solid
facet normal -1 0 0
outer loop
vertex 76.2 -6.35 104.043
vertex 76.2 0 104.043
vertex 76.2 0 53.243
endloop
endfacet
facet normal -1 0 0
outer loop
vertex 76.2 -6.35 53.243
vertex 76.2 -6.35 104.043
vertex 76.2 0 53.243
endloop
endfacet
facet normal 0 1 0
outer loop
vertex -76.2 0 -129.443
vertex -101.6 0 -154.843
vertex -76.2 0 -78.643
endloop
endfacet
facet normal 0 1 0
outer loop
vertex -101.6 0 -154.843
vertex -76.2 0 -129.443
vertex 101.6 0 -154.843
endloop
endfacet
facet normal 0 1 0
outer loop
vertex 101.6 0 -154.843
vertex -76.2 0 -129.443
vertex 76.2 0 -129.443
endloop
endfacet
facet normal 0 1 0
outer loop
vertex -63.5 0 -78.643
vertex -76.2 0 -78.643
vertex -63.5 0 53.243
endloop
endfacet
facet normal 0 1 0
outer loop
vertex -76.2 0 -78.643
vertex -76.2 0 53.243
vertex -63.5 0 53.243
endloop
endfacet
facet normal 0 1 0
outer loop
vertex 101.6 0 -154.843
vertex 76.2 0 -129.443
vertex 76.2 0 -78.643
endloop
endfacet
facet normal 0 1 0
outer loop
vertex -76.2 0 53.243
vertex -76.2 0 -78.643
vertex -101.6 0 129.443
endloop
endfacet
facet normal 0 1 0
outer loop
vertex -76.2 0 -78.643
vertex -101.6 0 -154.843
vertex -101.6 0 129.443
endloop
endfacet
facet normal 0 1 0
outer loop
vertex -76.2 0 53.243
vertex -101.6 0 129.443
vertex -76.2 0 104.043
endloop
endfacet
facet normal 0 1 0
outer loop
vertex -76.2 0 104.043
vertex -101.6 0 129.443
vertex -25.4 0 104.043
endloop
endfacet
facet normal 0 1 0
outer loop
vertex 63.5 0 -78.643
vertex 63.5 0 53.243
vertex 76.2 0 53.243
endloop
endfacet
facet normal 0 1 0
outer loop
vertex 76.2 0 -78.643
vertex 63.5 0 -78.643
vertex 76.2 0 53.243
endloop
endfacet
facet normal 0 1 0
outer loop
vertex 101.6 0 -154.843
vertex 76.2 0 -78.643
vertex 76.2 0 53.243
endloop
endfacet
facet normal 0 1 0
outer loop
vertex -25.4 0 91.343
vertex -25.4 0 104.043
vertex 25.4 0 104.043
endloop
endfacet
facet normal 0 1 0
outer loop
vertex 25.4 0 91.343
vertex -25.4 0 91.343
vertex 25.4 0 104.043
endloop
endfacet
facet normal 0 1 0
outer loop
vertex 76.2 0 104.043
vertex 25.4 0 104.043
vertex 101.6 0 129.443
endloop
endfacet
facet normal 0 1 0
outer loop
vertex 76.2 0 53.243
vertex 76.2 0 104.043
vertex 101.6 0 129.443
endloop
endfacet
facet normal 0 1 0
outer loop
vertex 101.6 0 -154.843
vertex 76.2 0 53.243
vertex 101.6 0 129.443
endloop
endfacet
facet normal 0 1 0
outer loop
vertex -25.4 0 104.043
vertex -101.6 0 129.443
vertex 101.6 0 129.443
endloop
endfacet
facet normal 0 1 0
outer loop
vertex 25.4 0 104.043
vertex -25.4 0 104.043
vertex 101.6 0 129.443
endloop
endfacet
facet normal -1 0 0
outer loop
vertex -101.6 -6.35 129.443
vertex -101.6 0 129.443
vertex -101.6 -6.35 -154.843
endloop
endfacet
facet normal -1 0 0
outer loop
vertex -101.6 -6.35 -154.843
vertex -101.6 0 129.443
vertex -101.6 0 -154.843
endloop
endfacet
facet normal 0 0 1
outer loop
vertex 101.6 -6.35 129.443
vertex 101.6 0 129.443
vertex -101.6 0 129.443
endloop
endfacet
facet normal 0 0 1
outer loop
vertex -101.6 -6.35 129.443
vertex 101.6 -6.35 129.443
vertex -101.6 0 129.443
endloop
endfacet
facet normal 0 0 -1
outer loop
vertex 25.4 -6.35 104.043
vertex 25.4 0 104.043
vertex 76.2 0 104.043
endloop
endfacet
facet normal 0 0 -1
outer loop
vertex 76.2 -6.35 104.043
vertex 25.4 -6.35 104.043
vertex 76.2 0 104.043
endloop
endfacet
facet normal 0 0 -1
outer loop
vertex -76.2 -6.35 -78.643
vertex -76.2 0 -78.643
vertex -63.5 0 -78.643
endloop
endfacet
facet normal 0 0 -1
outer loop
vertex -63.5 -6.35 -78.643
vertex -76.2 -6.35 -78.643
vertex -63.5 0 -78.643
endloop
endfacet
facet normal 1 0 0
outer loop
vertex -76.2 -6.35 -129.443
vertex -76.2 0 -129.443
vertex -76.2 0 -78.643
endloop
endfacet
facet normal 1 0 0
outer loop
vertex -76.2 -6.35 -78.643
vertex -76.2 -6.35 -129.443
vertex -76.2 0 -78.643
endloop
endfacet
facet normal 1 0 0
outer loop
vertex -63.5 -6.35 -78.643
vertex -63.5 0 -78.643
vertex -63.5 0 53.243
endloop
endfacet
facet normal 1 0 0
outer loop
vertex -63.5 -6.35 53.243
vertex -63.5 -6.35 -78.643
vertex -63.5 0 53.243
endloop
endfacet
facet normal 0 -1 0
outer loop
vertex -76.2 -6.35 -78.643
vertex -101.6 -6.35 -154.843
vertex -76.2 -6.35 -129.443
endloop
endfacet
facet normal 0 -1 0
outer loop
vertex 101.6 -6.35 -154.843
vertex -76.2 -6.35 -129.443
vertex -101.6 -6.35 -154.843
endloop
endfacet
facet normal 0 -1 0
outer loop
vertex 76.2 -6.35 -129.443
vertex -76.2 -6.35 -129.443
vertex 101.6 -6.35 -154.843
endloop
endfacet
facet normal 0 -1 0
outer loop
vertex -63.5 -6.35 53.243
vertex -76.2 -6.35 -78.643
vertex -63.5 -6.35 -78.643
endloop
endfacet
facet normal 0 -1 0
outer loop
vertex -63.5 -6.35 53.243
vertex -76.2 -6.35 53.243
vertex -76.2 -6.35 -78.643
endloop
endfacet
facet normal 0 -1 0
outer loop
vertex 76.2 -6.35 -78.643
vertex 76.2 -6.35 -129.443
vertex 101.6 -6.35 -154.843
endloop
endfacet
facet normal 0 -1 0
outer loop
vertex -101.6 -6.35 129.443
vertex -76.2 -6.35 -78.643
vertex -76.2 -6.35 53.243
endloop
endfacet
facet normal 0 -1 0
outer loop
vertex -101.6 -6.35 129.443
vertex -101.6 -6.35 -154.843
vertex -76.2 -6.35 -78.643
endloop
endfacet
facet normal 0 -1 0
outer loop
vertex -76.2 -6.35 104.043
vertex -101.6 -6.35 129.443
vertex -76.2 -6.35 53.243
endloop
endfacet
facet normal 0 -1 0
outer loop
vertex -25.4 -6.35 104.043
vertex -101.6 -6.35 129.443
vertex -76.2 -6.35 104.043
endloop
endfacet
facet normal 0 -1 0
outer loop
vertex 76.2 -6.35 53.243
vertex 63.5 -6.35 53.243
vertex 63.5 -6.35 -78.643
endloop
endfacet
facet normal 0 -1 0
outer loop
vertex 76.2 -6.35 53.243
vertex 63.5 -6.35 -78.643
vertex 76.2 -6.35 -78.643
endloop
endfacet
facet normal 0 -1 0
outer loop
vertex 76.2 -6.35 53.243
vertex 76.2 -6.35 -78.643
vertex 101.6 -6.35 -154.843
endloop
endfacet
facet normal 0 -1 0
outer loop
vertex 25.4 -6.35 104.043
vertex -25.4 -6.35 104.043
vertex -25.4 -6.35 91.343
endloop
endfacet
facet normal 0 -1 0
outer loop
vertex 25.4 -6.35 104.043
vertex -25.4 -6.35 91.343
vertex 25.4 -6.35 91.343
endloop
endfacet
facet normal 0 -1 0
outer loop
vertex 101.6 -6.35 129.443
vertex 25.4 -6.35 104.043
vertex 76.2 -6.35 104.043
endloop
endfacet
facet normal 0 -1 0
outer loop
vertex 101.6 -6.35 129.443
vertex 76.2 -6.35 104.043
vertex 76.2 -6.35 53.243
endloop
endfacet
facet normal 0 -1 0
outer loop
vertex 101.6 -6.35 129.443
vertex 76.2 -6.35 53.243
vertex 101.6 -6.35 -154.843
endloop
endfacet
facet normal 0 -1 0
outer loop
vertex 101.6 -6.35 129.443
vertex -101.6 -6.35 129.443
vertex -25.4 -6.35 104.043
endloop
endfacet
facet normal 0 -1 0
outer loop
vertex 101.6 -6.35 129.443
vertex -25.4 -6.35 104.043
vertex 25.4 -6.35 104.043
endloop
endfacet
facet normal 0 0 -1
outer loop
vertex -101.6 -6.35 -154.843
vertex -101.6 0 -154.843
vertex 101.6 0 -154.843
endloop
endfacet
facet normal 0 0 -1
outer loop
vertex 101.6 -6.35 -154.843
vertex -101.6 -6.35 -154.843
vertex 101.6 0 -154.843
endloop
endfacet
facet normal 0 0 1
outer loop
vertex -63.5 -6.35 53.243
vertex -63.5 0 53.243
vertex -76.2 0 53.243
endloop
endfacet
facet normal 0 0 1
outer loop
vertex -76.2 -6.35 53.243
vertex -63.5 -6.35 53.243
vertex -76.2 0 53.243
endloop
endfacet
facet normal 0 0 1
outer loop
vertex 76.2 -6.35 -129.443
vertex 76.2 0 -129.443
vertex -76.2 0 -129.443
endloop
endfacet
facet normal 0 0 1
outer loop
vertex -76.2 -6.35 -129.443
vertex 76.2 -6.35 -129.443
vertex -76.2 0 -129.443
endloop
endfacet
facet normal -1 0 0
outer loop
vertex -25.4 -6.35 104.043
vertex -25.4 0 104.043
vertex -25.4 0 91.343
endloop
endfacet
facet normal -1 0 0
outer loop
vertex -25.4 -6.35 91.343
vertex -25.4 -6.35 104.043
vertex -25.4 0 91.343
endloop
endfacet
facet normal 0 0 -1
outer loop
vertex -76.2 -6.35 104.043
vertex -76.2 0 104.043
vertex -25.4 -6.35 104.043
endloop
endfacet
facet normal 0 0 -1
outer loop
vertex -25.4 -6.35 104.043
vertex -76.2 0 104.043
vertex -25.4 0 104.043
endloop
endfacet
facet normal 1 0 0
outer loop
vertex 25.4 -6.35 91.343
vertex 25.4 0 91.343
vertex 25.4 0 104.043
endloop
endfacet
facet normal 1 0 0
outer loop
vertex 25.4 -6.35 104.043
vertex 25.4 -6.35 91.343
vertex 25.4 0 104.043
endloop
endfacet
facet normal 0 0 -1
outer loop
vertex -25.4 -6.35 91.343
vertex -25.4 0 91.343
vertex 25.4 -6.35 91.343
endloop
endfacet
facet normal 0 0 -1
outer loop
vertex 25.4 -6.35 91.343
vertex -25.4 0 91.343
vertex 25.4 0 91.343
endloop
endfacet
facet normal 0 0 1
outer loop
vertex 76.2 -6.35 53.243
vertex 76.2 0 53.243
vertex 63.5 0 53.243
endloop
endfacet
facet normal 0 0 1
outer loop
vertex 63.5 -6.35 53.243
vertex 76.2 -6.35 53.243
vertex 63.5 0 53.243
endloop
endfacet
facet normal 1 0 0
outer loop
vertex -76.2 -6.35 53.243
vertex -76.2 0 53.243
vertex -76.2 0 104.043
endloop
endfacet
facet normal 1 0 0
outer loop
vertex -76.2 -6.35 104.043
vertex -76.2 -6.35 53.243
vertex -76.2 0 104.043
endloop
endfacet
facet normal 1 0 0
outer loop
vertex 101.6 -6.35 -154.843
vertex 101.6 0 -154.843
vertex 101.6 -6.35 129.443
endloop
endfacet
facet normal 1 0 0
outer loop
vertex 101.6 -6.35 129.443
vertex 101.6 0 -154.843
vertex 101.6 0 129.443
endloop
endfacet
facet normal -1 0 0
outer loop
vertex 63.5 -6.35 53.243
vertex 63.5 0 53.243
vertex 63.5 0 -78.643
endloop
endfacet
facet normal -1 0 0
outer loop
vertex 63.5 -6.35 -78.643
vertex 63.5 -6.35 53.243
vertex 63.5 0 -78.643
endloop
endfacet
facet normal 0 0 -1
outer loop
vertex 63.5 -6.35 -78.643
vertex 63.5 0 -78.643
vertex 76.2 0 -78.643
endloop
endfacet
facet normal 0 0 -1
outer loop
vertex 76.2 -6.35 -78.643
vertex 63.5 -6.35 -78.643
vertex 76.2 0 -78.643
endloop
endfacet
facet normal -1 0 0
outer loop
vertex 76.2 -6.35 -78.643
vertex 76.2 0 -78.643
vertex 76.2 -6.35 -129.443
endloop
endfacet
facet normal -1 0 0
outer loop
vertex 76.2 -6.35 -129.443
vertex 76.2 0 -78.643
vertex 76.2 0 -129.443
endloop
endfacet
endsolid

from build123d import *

# Parameters (mm, degrees)
F1_DEPTH = 6.35


with BuildPart() as f1:
    # F0 (on Front) → F1 (new body)
    with BuildSketch(Plane.XZ):
        Polygon((76.2, -129.44348), (101.6, -129.44348), (101.6, 129.44348), (-101.6, 129.44348), (-101.6, -129.44348), (-76.2, -129.44348), (-76.2, -78.64348), (-63.5, -78.64348), (-63.5, 53.24348), (-76.2, 53.24348), (-76.2, 104.04348), (-25.4, 104.04348), (-25.4, 91.34348), (25.4, 91.34348), (25.4, 104.04348), (76.2, 104.04348), (76.2, 53.24348), (63.5, 53.24348), (63.5, -78.64348), (76.2, -78.64348), align=None)
        Polygon((101.6, -154.84348), (101.6, -129.44348), (76.2, -129.44348), (63.5, -129.44348), (-63.5, -129.44348), (-76.2, -129.44348), (-101.6, -129.44348), (-101.6, -154.84348), align=None)
    extrude(amount=F1_DEPTH)


solid = f1.part
